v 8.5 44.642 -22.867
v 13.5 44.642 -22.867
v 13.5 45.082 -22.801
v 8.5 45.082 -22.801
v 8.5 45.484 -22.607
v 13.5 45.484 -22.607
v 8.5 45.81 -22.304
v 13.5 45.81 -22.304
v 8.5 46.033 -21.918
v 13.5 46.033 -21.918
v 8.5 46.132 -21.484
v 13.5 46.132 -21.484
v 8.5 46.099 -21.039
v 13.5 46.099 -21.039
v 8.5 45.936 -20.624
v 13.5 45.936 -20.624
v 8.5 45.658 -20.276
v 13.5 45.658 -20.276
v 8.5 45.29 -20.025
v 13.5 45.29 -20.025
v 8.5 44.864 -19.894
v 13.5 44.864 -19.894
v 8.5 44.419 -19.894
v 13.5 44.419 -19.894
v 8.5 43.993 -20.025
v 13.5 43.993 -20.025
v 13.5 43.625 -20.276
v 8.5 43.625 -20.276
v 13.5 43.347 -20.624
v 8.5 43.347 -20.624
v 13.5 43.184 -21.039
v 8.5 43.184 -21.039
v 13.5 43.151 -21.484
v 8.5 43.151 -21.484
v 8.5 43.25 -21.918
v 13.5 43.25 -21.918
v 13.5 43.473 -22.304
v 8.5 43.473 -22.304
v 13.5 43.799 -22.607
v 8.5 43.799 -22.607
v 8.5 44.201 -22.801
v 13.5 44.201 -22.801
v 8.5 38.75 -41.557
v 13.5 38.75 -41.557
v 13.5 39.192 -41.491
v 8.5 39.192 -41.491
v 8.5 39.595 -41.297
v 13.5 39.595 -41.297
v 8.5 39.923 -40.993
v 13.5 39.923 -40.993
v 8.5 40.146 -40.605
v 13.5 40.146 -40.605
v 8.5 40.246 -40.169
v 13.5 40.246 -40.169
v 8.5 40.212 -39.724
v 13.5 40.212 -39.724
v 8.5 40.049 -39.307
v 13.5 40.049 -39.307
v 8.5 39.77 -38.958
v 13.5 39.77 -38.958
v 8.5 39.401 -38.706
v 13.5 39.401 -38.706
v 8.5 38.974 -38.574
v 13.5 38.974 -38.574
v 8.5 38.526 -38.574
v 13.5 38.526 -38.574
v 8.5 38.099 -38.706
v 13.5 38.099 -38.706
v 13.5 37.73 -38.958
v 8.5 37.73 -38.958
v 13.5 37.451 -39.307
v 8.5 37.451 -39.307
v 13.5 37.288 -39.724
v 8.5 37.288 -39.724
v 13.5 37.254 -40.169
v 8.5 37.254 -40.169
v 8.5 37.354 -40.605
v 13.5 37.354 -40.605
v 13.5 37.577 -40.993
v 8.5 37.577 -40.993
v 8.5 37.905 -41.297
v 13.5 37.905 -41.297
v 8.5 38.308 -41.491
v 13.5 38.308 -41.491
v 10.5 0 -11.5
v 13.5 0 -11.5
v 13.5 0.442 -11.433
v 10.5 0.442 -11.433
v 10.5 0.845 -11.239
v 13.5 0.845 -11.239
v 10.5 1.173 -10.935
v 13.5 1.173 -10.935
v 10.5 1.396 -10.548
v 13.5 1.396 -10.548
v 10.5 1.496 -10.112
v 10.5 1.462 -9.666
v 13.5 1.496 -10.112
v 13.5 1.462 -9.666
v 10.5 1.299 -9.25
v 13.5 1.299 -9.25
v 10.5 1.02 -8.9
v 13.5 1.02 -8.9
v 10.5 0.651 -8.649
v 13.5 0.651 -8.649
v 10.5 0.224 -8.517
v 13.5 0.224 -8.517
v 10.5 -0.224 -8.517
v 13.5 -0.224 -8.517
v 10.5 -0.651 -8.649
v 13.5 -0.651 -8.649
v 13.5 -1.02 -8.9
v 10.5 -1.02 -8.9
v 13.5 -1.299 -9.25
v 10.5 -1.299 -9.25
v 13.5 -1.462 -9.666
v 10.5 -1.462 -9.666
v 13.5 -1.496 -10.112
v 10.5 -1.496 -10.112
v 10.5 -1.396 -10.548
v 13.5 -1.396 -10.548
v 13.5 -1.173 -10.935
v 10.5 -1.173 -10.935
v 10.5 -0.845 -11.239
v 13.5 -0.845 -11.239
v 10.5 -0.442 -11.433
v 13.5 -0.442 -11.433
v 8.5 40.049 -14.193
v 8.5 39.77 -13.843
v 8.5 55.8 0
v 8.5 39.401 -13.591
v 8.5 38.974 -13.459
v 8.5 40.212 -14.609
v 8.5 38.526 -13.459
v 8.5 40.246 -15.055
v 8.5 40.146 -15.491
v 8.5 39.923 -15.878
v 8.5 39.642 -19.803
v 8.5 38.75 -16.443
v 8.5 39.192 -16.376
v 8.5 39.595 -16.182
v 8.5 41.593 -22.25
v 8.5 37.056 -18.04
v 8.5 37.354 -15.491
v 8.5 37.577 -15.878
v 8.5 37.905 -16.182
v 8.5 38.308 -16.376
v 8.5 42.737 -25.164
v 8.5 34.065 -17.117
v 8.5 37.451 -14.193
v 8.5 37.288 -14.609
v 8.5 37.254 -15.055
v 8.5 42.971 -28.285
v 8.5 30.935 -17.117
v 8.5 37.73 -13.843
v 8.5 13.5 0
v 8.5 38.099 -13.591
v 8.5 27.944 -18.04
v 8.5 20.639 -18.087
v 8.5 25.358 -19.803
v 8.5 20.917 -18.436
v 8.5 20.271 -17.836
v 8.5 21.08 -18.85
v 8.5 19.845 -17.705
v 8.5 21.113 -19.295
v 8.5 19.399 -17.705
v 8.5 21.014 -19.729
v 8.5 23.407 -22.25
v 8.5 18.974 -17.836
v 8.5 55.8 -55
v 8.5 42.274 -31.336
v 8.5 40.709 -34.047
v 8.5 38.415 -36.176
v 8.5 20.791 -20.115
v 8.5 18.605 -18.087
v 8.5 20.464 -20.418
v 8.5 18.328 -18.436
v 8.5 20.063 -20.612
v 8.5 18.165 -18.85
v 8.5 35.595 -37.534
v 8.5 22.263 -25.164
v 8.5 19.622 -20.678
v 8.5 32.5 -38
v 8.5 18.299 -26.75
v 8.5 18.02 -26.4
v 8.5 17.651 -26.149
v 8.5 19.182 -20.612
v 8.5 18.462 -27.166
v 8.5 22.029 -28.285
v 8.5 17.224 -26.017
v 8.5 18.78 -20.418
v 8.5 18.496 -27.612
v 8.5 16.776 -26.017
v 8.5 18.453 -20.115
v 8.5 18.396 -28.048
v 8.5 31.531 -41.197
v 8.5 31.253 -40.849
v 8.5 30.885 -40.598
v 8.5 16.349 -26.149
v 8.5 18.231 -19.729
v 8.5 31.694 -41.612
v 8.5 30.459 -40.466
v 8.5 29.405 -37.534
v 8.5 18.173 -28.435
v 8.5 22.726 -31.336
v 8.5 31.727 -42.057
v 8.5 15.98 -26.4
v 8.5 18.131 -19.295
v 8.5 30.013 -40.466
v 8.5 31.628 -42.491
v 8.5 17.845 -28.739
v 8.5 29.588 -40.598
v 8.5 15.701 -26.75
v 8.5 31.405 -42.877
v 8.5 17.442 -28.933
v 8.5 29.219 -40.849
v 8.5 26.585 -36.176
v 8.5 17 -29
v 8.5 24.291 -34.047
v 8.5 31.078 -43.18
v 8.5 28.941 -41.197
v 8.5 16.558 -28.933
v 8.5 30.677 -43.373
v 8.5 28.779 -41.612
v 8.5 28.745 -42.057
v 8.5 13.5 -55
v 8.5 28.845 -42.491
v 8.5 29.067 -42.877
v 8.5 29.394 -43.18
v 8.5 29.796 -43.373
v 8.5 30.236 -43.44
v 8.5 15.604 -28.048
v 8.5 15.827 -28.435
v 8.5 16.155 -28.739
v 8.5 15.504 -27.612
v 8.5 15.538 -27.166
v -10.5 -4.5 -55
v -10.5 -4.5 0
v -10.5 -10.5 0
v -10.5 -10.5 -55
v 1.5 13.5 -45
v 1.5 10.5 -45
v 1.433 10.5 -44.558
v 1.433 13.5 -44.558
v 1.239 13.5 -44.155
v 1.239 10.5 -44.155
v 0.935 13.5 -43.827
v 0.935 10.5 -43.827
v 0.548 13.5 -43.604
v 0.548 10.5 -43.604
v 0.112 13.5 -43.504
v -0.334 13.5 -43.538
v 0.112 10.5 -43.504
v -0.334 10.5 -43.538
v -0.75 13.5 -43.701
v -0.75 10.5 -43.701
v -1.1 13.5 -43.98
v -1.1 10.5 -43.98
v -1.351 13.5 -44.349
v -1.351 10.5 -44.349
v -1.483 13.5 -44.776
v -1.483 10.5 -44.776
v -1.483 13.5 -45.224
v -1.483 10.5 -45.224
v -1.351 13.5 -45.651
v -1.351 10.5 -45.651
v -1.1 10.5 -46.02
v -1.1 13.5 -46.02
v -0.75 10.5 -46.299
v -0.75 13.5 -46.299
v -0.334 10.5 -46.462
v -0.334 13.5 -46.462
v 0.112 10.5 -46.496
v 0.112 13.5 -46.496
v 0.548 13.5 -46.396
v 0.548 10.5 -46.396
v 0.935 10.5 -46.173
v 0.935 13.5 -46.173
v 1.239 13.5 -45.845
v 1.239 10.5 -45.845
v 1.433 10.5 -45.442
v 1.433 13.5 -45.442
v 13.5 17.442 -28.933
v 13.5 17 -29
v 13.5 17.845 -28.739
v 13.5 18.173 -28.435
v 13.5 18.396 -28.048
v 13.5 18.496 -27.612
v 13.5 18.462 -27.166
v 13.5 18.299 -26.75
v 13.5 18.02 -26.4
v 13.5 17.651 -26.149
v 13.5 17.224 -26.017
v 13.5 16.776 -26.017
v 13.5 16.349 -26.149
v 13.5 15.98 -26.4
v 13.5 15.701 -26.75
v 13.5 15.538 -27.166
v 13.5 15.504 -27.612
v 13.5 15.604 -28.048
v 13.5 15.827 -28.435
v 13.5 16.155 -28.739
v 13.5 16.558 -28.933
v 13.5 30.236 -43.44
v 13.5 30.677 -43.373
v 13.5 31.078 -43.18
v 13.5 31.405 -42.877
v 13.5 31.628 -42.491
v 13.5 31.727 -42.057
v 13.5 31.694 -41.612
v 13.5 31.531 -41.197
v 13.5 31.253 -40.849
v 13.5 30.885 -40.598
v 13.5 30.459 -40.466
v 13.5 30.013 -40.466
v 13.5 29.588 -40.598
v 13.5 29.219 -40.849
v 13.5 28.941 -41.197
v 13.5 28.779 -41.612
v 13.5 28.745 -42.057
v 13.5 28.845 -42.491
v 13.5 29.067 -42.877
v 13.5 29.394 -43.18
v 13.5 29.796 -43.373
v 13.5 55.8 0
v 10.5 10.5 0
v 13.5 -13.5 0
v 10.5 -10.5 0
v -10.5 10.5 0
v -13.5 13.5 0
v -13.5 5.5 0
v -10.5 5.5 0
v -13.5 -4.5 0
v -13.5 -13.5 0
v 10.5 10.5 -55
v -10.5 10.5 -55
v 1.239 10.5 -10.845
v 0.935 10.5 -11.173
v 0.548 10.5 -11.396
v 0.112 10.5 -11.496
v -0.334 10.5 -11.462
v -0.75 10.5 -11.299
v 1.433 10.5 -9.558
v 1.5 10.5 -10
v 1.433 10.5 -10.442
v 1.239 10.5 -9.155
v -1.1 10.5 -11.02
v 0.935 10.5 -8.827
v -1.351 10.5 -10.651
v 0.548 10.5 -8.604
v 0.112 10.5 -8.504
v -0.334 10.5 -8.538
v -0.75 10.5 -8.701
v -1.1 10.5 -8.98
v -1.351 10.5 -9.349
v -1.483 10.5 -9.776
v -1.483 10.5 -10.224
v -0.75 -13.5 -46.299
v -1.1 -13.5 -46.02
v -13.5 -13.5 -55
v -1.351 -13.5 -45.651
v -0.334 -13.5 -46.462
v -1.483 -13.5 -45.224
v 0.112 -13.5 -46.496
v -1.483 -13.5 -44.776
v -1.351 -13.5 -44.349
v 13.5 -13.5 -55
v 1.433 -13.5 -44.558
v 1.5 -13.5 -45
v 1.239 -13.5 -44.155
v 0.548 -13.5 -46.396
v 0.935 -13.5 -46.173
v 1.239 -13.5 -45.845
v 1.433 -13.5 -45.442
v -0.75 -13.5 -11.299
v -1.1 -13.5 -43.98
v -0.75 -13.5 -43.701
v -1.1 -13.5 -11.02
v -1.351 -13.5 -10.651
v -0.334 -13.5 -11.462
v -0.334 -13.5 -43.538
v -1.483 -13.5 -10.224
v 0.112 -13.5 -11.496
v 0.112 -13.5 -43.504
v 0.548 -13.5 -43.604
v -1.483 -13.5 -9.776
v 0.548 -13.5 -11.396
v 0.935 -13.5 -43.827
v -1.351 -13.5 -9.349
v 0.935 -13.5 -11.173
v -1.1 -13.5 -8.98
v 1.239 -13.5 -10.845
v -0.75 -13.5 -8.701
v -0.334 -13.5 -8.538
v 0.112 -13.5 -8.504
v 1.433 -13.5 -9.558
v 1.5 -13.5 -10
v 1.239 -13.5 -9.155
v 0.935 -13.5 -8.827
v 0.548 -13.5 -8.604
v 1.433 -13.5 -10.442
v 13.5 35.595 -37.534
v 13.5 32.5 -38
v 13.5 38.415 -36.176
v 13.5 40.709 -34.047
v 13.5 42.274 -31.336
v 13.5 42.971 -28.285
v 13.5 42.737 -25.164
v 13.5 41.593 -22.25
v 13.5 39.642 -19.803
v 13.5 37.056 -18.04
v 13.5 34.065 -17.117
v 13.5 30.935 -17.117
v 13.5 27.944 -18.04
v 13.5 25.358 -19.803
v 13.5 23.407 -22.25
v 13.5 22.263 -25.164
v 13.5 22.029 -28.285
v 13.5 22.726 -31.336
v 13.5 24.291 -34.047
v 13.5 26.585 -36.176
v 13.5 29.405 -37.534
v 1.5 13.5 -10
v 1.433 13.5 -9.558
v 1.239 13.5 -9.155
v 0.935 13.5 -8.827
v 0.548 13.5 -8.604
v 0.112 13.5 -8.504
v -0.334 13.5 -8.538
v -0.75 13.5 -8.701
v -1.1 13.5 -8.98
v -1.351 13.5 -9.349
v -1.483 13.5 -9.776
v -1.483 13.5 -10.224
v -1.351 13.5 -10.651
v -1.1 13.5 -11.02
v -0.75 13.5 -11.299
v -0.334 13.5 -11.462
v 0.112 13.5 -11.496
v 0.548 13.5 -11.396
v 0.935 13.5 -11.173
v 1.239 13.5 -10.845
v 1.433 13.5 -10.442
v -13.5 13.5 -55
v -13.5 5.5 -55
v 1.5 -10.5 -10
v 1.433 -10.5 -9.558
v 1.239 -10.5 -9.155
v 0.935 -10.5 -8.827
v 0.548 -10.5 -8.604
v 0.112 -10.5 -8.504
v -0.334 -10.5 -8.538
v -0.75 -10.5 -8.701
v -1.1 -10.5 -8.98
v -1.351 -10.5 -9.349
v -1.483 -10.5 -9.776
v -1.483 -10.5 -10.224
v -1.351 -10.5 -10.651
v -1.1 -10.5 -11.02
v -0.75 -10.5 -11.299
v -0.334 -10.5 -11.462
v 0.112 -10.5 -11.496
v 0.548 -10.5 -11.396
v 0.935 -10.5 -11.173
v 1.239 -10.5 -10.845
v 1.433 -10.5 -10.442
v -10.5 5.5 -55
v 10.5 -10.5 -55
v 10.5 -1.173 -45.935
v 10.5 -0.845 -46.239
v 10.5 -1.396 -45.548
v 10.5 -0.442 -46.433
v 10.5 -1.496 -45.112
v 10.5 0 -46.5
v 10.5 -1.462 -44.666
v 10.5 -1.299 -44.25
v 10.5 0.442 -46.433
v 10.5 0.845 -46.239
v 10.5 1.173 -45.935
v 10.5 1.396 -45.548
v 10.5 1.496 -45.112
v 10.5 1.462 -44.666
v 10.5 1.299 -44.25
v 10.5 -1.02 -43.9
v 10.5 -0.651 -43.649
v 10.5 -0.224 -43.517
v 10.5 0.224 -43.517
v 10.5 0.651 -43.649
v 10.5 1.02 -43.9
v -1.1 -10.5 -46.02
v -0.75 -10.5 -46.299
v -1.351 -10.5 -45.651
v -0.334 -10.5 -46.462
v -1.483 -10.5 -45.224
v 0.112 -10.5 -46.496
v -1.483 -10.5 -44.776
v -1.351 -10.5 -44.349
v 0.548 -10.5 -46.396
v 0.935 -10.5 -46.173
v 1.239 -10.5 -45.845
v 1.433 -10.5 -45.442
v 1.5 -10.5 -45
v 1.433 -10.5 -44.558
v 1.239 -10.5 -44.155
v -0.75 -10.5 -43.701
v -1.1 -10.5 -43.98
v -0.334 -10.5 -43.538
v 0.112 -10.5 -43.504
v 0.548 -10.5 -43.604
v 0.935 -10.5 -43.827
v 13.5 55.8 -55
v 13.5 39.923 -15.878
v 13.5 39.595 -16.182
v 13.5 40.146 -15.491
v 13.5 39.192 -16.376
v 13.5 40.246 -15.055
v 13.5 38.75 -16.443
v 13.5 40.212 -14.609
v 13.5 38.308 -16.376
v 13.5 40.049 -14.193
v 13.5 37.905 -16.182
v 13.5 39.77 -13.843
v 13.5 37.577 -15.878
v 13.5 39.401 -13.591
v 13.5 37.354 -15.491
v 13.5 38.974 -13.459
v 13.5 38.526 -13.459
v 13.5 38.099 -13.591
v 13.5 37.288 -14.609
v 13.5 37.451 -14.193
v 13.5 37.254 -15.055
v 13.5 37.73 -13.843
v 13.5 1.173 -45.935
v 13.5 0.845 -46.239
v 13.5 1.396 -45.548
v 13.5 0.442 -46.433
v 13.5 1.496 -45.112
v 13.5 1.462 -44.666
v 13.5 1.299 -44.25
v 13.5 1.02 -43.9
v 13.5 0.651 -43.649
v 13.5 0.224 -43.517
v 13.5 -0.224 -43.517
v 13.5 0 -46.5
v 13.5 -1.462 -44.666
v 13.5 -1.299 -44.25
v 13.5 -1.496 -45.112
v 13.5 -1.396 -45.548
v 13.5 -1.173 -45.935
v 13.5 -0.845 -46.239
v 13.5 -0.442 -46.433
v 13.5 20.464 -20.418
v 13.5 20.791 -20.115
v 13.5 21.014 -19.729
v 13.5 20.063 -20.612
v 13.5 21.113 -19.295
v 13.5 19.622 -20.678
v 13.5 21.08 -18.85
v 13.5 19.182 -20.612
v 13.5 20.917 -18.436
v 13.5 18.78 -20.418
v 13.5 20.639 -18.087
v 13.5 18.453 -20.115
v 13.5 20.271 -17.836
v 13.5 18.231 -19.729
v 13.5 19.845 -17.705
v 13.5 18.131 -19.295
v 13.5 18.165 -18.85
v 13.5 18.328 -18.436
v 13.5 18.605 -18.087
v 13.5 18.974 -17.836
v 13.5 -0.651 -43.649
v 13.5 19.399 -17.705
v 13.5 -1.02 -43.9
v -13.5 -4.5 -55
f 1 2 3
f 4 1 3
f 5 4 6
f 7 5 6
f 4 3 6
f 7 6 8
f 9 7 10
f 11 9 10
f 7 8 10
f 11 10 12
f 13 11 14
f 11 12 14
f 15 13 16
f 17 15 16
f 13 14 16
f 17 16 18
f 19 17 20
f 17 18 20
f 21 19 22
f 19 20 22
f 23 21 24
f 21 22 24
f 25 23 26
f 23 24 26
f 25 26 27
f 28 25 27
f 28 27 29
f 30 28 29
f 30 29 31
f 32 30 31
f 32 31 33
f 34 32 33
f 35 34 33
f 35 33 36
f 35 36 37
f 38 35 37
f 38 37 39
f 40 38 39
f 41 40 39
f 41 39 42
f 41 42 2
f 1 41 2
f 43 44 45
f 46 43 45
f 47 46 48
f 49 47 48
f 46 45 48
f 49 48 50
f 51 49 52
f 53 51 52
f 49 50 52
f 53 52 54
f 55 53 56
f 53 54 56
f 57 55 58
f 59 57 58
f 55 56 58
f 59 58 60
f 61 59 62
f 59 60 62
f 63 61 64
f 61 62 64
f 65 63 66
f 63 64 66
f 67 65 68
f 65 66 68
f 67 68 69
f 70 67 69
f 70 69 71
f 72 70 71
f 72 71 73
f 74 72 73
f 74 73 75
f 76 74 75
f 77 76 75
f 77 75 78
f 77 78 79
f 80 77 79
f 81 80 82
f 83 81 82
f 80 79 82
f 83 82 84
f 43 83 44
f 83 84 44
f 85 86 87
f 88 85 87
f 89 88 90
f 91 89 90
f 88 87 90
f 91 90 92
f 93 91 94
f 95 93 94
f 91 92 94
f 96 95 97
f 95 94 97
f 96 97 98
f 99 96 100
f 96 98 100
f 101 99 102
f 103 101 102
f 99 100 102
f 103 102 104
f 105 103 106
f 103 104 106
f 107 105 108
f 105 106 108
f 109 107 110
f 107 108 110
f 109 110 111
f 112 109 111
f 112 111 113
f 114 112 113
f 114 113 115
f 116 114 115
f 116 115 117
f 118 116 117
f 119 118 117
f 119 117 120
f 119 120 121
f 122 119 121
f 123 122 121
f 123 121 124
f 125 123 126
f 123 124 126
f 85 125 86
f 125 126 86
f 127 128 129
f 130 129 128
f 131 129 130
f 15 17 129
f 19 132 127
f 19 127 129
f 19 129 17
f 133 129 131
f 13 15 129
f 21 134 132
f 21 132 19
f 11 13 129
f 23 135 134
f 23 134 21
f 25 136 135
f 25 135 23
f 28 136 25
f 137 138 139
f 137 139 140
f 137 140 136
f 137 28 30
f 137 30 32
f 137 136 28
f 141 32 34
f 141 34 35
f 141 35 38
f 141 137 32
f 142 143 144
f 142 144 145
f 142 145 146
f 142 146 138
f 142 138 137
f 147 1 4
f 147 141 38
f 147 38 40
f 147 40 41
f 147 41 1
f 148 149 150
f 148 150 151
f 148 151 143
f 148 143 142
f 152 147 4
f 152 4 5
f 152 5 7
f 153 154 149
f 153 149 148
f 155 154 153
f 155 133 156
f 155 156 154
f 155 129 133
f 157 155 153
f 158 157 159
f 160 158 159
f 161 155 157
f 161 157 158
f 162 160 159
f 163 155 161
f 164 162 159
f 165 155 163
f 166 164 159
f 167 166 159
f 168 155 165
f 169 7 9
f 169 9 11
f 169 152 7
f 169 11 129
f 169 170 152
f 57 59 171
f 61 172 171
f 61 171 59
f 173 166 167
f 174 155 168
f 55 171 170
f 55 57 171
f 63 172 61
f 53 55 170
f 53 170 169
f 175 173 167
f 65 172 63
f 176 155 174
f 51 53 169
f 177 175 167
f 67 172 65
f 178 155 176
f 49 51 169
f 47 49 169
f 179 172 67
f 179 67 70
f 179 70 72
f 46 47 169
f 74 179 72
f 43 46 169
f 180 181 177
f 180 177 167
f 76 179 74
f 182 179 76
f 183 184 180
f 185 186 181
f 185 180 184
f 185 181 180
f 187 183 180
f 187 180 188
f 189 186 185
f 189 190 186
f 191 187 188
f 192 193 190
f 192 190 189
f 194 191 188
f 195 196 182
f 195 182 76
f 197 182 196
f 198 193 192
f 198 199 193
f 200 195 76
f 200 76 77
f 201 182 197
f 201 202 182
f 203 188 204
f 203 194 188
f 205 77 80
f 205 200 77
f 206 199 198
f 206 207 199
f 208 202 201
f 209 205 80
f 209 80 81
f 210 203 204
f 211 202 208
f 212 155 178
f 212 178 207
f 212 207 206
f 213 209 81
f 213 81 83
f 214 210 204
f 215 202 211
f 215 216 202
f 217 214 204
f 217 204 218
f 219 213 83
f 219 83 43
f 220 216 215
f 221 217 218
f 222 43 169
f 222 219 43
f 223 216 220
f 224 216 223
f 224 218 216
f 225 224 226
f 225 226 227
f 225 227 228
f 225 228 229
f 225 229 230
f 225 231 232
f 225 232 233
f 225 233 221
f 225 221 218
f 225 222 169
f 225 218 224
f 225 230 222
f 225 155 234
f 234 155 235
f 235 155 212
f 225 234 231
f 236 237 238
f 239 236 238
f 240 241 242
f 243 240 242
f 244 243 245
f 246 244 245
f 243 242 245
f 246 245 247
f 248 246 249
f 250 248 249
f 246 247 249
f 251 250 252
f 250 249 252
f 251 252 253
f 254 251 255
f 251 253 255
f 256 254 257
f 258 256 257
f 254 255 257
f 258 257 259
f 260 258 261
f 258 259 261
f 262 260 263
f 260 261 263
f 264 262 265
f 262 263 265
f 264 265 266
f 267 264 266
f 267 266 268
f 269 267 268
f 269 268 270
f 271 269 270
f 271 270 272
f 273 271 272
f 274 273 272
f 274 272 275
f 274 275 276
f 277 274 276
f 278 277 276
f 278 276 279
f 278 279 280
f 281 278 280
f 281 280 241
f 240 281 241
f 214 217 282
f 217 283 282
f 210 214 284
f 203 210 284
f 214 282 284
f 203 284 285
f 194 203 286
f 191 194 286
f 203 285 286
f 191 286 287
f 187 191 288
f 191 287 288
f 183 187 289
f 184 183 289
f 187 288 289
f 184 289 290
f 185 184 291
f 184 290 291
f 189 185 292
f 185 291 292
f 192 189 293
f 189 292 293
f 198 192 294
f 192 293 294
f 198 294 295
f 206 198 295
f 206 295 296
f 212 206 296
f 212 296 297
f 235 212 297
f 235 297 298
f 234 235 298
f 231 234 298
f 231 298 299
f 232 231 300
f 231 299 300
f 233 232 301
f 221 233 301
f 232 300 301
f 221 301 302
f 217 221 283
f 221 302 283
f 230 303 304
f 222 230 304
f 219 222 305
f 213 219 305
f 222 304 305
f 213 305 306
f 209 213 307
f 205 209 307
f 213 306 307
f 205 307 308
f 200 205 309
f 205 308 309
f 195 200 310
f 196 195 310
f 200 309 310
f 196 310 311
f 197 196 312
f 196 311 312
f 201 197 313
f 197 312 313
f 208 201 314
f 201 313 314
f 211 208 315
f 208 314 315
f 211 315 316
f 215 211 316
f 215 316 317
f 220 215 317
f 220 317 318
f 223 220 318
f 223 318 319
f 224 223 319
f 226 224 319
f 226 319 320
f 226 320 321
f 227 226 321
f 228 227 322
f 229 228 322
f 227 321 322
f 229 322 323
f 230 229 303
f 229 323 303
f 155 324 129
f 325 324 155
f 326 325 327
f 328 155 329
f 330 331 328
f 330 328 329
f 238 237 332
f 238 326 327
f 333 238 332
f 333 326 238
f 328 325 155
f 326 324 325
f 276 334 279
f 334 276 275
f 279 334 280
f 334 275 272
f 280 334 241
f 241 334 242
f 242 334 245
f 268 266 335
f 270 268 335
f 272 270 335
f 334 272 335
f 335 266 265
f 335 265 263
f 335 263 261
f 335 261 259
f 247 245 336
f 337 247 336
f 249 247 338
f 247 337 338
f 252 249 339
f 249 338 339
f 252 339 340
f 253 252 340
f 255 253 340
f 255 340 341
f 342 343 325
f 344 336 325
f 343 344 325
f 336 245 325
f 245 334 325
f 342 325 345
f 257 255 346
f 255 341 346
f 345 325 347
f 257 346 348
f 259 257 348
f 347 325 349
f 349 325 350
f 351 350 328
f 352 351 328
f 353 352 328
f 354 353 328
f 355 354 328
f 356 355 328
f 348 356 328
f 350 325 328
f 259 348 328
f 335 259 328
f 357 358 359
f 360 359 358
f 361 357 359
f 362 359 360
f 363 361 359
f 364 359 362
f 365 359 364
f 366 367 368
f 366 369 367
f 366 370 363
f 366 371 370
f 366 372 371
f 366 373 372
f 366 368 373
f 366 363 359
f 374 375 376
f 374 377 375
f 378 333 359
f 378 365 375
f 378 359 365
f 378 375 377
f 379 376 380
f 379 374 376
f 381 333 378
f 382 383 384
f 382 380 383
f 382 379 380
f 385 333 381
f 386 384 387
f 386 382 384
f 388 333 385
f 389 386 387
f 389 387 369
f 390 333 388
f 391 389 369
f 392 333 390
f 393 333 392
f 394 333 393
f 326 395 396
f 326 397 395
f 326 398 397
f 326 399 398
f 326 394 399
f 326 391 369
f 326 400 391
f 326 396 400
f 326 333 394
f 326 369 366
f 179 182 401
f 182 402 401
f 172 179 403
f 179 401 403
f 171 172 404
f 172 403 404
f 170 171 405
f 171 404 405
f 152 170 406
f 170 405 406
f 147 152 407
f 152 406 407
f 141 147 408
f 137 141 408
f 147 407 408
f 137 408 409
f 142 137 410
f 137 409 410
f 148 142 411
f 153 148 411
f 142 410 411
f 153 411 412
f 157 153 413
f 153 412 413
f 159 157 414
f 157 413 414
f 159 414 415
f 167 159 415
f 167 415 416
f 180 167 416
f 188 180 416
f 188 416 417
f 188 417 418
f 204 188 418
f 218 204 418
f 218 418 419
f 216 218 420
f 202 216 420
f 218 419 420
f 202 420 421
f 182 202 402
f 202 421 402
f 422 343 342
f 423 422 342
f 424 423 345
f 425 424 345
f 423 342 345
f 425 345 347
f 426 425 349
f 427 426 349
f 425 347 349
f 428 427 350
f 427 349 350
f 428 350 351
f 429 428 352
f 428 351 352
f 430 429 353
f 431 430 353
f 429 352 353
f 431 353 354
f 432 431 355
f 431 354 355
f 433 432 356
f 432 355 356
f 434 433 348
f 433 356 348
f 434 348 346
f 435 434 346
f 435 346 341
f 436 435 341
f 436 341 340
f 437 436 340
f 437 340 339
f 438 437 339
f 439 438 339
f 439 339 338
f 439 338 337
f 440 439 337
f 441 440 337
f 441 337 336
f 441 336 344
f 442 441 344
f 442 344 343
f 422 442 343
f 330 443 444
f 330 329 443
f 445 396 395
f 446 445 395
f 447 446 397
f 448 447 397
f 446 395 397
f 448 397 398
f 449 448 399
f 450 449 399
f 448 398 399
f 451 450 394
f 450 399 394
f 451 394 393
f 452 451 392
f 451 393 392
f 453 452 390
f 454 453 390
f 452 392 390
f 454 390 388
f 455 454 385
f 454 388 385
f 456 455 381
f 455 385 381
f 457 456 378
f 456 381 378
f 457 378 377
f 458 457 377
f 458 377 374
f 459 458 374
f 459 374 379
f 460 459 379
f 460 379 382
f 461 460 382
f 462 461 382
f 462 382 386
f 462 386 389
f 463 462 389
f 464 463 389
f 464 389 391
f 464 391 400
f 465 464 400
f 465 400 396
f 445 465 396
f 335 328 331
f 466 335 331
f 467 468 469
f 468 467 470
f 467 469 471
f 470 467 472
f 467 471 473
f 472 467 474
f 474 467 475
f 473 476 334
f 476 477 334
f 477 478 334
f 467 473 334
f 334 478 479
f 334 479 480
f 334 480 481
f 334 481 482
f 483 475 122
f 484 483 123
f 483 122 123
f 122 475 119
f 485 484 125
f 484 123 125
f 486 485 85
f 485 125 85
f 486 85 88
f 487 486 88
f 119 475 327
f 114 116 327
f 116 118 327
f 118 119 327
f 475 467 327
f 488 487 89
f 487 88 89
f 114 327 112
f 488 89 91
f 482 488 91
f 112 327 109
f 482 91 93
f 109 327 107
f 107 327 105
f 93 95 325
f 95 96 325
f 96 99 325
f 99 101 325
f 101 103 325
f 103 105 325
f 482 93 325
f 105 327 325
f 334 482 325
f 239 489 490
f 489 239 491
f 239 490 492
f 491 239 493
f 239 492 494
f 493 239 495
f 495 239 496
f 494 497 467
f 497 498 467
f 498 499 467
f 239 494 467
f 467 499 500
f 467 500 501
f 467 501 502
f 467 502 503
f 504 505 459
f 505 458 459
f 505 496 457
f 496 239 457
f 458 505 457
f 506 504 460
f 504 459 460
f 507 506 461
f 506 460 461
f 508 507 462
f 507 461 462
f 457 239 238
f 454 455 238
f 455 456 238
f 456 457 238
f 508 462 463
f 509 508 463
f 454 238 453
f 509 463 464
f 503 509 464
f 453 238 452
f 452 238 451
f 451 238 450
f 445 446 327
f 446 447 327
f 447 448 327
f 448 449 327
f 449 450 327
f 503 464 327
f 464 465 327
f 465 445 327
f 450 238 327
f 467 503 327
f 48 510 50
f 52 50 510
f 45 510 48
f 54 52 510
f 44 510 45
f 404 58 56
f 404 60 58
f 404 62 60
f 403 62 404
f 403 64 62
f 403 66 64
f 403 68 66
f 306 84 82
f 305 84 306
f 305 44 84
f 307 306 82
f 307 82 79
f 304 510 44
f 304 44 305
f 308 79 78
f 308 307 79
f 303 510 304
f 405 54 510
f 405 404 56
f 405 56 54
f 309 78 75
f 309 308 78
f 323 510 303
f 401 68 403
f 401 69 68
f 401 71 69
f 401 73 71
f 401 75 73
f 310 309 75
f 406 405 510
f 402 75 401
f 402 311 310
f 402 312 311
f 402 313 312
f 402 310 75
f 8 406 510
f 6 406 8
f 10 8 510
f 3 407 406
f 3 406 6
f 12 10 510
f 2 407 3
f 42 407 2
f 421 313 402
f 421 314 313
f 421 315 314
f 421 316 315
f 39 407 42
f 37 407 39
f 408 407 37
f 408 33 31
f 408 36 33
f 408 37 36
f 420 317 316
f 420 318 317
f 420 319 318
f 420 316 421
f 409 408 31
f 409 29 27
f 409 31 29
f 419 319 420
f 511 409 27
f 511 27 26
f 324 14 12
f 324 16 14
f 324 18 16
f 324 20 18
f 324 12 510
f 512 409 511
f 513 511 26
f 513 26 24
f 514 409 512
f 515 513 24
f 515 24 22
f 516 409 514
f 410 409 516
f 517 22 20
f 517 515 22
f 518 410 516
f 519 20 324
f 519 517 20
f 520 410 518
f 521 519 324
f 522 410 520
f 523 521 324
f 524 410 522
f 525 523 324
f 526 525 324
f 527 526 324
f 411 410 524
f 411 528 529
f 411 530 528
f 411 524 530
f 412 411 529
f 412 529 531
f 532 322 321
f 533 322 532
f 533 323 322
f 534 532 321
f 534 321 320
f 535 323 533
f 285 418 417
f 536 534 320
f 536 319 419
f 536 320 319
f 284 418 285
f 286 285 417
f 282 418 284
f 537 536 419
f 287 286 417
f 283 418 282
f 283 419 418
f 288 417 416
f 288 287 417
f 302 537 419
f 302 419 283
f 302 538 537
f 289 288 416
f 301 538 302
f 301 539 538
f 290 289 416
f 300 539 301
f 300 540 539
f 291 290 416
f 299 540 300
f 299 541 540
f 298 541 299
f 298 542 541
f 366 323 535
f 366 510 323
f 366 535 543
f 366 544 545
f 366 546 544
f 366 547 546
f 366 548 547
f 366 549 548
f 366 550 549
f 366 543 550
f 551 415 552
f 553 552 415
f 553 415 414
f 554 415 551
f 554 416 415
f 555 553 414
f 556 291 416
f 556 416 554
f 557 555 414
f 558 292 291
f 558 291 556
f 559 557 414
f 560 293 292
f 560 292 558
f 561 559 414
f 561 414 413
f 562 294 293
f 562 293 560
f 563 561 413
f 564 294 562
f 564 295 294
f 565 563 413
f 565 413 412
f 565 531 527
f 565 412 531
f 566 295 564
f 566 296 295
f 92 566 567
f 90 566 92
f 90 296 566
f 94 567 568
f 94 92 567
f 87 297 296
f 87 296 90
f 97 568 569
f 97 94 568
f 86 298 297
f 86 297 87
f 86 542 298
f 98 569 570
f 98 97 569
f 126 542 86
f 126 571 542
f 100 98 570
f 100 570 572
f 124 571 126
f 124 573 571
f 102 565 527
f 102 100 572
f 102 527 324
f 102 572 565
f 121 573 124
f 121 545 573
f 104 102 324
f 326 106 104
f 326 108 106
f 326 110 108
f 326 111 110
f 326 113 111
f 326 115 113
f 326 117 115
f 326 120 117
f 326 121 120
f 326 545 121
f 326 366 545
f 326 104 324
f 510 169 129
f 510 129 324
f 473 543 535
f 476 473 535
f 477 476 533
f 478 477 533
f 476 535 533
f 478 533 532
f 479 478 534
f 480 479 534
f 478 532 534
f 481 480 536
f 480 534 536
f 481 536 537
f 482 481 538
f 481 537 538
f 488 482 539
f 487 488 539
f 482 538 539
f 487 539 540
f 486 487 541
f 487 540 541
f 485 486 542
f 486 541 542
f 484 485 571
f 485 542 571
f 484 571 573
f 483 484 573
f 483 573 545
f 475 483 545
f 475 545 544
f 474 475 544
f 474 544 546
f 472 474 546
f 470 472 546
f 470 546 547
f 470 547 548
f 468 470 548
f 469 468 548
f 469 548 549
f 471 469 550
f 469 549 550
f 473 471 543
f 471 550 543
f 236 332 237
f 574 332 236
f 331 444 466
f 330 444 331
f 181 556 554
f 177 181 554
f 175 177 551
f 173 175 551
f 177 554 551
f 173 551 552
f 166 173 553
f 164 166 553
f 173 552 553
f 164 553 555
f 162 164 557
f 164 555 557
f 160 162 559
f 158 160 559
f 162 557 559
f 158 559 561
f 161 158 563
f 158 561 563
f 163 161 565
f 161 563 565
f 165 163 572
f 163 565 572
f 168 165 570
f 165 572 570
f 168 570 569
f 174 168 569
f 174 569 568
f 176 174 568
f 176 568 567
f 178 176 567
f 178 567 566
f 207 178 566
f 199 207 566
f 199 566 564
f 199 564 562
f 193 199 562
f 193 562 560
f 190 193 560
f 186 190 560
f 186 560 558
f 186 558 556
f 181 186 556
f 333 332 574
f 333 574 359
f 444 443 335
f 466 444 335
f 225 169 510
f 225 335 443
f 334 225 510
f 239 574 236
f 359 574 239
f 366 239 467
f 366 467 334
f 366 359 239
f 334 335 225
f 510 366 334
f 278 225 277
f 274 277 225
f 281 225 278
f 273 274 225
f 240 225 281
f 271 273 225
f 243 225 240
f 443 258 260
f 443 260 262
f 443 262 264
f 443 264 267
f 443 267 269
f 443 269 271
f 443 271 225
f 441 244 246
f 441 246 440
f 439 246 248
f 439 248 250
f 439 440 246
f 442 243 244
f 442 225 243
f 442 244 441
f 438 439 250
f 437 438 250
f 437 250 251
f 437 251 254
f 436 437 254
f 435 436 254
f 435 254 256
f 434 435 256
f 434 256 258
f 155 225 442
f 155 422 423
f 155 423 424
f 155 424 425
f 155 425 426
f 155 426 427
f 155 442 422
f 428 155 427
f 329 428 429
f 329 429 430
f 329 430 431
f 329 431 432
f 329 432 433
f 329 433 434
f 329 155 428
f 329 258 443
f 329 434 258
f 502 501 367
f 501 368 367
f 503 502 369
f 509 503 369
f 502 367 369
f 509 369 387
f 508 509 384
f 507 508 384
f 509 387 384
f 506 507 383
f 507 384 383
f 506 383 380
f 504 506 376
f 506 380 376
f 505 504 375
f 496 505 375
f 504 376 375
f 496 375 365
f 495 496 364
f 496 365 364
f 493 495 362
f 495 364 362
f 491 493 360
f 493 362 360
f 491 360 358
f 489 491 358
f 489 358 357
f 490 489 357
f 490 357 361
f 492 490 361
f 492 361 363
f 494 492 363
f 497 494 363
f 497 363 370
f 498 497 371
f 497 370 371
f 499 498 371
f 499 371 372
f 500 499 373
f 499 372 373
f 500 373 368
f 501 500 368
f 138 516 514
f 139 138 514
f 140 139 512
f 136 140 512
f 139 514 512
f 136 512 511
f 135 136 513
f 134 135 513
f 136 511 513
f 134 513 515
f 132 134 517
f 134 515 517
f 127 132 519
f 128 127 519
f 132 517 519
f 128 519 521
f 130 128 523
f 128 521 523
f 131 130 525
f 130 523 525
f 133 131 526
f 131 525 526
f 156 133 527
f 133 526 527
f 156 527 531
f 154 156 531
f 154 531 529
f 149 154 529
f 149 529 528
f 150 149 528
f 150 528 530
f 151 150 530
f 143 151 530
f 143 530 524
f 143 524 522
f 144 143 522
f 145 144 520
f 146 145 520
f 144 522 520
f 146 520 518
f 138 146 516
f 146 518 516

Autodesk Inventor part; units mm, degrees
ref_plane "YZ Plane" through (0, 0, 0) normal (1, 0, 0) x (0, 1, 0)
ref_plane "XZ Plane" through (0, 0, 0) normal (0, 1, 0) x (-1, 0, 0)
ref_plane "XY Plane" through (0, 0, 0) normal (0, 0, 1) x (1, 0, 0)
sketch "Sketch1" plane through (0, 0, 0) normal (0, 0, 1) x (1, 0, 0)
  line L0 (10, 10) -> (-10, 10) construction
  line L1 (-10, 10) -> (-10, -10) construction
  line L2 (-10, -10) -> (10, -10) construction
  line L3 (10, -10) -> (10, 10) construction
  line L4 (-7, -7) -> (-7, 7) construction
  line L5 (-7, 7) -> (7, 7) construction
  line L6 (7, 7) -> (7, -7) construction
  line L7 (7, -7) -> (-7, -7) construction
  line L8 (13.5, 13.5) -> (-13.5, 13.5)
  line L9 (-13.5, 13.5) -> (-13.5, -13.5)
  line L10 (-13.5, -13.5) -> (13.5, -13.5)
  line L11 (13.5, -13.5) -> (13.5, 13.5)
  line L12 (10.5, 10.5) -> (-10.5, 10.5)
  line L13 (-10.5, 10.5) -> (-10.5, -10.5)
  line L14 (-10.5, -10.5) -> (10.5, -10.5)
  line L15 (10.5, -10.5) -> (10.5, 10.5)
  point P0 (0, 0)
  point P1 (-10.5, 0)
  point P2 (0, 10.5)
  dimension "d36" = 21
  dimension "d37" = 21
  dimension "d38" = 3
  dimension "d39" = 3
  dimension "d40" = 3
  dimension "d41" = 3
extrude "Extrusion1" add sketch "Sketch1" against normal blind 55
sketch "Sketch2" plane through (-13.5, -13.5, 0) normal (-1, 0, 0) x (0, 0, 1)
  line L0 (-80.4804, 19) -> (40.5, 19)
  line L1 (40.5, 19) -> (40.5, 9)
  line L2 (40.5, 9) -> (-80.4804, 9)
  line L3 (-80.4804, 9) -> (-80.4804, 19)
  line L4 (0, 27) -> (-55, 27) projected
  point P0 (0, 13.5)
  dimension "d7" = 10
  dimension "d8" = 8
extrude "Extrusion2" cut sketch "Sketch2" against normal blind 15.3125
sketch "Sketch3" plane through (-13.5, 13.5, 0) normal (0, 1, 0) x (1, 0, 0)
  line L0 (27, 0) -> (0, 0) projected
  line L1 (3, 55) -> (23, 55) projected
  line L2 (27, 0) -> (22, 0)
  line L3 (22, 0) -> (22, 55)
  line L4 (22, 55) -> (27, 55)
  line L5 (27, 55) -> (27, 0)
  point P0 (13.5, 0)
  dimension "d11" = 5
extrude "Extrusion3" add sketch "Sketch3" along normal blind 42.3
sketch "Sketch4" plane through (13.5, -13.5, 0) normal (1, 0, 0) x (0, 0, -1)
  line L0 (0, 27) -> (55, 27) projected
  circle A0 centre (27.5, 46) radius 18
  line L1 (0, 69.3) -> (55, 69.3) projected
  circle A1 centre (27.5, 46) radius 3
  point P0 (0, 13.5)
  point P1 (27.5, 69.3)
  dimension "d14" = 36
  dimension "d15" = 19
  dimension "d16" = 6
extrude "Extrusion4" cut sketch "Sketch4" against normal blind 42.3 contours A1
sketch "Sketch5" plane through (13.5, -13.5, 0) normal (1, 0, 0) x (0, 0, -1)
  circle A0 centre (27.5, 46) radius 3 projected
  circle A1 centre (27.5, 46) radius 10.5
  point P0 (0, 13.5)
  dimension "d19" = 21
extrude "Extrusion5" cut sketch "Sketch5" against normal blind 42.3
sketch "Sketch6" plane through (13.5, -13.5, 0) normal (1, 0, 0) x (0, 0, -1)
  circle A0 centre (27.5, 30.5) radius 1.5 projected
  circle A1 centre (19.1831, 33.1223) radius 1.495 projected
  circle A2 centre (14.9426, 52.25) radius 1.5 projected
  circle A3 centre (21.372, 58.1415) radius 1.495 projected
  circle A4 centre (40.0574, 52.25) radius 1.5 projected
  circle A5 centre (41.9448, 43.7362) radius 1.495 projected
  point P0 (0, 13.5)
extrude "Extrusion6" cut sketch "Sketch6" against normal blind 42.3
sketch "Sketch7" plane through (13.5, -13.5, 0) normal (1, 0, 0) x (0, 0, -1)
  circle A0 centre (10, 13.5) radius 1.5
  circle A1 centre (45, 13.5) radius 1.5
  line L0 (0, 0) -> (0, 69.3) projected
  line L1 (55, 0) -> (55, 69.3) projected
  point P0 (0, 13.5)
  dimension "d24" = 3
  dimension "d25" = 3
  dimension "d26" = 10
  dimension "d27" = 10
extrude "Extrusion7" cut sketch "Sketch7" against normal blind 10
sketch "Sketch8" plane through (-13.5, -13.5, 0) normal (0, -1, 0) x (1, 0, 0)
  circle A0 centre (13.5, -10) radius 1.5
  circle A1 centre (13.5, -45) radius 1.5
  line L0 (27, -55) -> (0, -55) projected
  line L1 (0, 0) -> (27, 0) projected
  point P0 (13.5, 0)
  point P1 (13.5, 0)
  point P2 (13.5, 0)
  dimension "d30" = 3
  dimension "d31" = 3
  dimension "d32" = 10
  dimension "d33" = 10
extrude "Extrusion8" cut sketch "Sketch8" against normal through all
properties part number "enc holder"
